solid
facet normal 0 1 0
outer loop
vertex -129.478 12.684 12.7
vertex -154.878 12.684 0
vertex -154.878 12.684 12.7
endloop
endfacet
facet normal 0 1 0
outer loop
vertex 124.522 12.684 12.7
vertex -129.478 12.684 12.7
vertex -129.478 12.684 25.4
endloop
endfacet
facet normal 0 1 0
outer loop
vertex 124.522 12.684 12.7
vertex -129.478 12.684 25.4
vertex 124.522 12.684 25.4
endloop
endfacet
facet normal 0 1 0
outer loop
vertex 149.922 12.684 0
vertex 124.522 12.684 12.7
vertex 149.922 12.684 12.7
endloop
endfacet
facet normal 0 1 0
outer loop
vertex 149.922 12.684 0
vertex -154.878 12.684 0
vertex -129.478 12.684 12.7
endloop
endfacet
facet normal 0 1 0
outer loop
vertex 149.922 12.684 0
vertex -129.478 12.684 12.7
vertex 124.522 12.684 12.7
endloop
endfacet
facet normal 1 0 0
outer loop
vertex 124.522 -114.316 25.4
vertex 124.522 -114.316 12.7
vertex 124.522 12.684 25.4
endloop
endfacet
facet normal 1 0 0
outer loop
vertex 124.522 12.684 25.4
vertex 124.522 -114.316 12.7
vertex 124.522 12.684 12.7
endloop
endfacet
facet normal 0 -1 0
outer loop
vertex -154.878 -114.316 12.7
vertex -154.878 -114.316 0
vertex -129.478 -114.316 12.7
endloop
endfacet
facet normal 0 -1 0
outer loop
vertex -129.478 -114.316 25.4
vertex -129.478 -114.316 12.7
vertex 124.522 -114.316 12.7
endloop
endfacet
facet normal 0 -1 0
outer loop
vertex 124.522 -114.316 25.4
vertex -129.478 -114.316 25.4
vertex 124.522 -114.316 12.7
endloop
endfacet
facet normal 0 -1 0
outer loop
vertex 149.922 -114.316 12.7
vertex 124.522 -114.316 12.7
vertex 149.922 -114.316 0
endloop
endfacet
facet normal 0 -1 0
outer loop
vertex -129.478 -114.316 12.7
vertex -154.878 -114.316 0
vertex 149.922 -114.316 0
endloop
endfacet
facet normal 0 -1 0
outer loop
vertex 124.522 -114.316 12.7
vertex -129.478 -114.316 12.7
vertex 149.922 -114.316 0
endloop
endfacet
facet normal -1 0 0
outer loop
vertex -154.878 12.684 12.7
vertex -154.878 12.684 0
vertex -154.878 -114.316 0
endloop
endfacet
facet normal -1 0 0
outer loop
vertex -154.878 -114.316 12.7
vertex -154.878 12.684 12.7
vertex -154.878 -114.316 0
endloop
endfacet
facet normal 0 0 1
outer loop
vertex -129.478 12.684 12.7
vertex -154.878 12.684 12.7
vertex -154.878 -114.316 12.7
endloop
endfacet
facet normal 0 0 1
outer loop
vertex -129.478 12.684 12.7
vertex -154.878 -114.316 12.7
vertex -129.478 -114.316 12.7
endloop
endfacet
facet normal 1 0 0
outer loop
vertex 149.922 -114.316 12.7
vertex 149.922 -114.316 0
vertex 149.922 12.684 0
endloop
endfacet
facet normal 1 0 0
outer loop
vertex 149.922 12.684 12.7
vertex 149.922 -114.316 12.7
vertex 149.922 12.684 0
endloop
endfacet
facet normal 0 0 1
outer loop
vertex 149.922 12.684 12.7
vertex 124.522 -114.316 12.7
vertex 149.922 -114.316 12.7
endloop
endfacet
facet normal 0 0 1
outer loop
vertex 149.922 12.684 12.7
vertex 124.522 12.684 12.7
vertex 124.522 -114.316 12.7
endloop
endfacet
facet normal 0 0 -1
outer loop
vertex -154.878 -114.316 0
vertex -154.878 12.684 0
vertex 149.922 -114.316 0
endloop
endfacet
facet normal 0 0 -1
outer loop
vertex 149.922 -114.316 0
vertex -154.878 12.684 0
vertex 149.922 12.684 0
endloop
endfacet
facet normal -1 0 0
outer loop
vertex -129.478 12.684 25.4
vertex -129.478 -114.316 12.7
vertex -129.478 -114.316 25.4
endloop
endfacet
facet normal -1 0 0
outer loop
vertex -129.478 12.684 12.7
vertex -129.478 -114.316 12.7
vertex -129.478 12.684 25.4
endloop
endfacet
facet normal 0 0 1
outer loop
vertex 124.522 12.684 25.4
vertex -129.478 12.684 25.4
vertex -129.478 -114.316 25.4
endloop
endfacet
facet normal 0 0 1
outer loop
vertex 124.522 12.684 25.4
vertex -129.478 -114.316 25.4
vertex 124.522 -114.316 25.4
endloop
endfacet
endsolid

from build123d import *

# Parameters (mm, degrees)
F0_W     = 254
F0_H     = 127
F1_DEPTH = 25.4
F0_W_2   = 25.4
F0_H_2   = 12.7
F2_DEPTH = 12.7
F3_W     = 304.8
F3_H     = 12.7
F4_DEPTH = 25.4


with BuildPart() as f1:
    # F0 (on Top) → F1 (new body)
    with BuildSketch(Plane.XY):
        with Locations((-2.477834, -50.816161)):
            Rectangle(F0_W, F0_H)
    extrude(amount=F1_DEPTH)

    # F0 (on Top) → F2 (join)
    with BuildSketch(Plane.XY):
        with Locations((-142.177834, 19.033839)):
            Rectangle(F0_W_2, F0_H_2)
        with Locations((-2.477834, 19.033839)):
            Rectangle(F0_W, F0_H_2)
        with Locations((-142.177834, -50.816161)):
            Rectangle(F0_W_2, F0_H)
        with Locations((137.222166, 19.033839)):
            Rectangle(F0_W_2, F0_H_2)
        with Locations((-142.177834, -120.666161)):
            Rectangle(F0_W_2, F0_H_2)
        with Locations((137.222166, -50.816161)):
            Rectangle(F0_W_2, F0_H)
        with Locations((-2.477834, -120.666161)):
            Rectangle(F0_W, F0_H_2)
        with Locations((137.222166, -120.666161)):
            Rectangle(F0_W_2, F0_H_2)
    extrude(amount=F2_DEPTH)

    # F3 (on face) → F4 (cut)
    with BuildSketch(Plane(origin=(0, 0, 0), x_dir=(1, 0, 0), z_dir=(0, 0, -1))):
        with Locations((-2.477834, 120.666161)):
            Rectangle(F3_W, F3_H)
        with Locations((-2.477834, -19.033839)):
            Rectangle(F3_W, F3_H)
    extrude(amount=-F4_DEPTH, mode=Mode.SUBTRACT)


solid = f1.part
